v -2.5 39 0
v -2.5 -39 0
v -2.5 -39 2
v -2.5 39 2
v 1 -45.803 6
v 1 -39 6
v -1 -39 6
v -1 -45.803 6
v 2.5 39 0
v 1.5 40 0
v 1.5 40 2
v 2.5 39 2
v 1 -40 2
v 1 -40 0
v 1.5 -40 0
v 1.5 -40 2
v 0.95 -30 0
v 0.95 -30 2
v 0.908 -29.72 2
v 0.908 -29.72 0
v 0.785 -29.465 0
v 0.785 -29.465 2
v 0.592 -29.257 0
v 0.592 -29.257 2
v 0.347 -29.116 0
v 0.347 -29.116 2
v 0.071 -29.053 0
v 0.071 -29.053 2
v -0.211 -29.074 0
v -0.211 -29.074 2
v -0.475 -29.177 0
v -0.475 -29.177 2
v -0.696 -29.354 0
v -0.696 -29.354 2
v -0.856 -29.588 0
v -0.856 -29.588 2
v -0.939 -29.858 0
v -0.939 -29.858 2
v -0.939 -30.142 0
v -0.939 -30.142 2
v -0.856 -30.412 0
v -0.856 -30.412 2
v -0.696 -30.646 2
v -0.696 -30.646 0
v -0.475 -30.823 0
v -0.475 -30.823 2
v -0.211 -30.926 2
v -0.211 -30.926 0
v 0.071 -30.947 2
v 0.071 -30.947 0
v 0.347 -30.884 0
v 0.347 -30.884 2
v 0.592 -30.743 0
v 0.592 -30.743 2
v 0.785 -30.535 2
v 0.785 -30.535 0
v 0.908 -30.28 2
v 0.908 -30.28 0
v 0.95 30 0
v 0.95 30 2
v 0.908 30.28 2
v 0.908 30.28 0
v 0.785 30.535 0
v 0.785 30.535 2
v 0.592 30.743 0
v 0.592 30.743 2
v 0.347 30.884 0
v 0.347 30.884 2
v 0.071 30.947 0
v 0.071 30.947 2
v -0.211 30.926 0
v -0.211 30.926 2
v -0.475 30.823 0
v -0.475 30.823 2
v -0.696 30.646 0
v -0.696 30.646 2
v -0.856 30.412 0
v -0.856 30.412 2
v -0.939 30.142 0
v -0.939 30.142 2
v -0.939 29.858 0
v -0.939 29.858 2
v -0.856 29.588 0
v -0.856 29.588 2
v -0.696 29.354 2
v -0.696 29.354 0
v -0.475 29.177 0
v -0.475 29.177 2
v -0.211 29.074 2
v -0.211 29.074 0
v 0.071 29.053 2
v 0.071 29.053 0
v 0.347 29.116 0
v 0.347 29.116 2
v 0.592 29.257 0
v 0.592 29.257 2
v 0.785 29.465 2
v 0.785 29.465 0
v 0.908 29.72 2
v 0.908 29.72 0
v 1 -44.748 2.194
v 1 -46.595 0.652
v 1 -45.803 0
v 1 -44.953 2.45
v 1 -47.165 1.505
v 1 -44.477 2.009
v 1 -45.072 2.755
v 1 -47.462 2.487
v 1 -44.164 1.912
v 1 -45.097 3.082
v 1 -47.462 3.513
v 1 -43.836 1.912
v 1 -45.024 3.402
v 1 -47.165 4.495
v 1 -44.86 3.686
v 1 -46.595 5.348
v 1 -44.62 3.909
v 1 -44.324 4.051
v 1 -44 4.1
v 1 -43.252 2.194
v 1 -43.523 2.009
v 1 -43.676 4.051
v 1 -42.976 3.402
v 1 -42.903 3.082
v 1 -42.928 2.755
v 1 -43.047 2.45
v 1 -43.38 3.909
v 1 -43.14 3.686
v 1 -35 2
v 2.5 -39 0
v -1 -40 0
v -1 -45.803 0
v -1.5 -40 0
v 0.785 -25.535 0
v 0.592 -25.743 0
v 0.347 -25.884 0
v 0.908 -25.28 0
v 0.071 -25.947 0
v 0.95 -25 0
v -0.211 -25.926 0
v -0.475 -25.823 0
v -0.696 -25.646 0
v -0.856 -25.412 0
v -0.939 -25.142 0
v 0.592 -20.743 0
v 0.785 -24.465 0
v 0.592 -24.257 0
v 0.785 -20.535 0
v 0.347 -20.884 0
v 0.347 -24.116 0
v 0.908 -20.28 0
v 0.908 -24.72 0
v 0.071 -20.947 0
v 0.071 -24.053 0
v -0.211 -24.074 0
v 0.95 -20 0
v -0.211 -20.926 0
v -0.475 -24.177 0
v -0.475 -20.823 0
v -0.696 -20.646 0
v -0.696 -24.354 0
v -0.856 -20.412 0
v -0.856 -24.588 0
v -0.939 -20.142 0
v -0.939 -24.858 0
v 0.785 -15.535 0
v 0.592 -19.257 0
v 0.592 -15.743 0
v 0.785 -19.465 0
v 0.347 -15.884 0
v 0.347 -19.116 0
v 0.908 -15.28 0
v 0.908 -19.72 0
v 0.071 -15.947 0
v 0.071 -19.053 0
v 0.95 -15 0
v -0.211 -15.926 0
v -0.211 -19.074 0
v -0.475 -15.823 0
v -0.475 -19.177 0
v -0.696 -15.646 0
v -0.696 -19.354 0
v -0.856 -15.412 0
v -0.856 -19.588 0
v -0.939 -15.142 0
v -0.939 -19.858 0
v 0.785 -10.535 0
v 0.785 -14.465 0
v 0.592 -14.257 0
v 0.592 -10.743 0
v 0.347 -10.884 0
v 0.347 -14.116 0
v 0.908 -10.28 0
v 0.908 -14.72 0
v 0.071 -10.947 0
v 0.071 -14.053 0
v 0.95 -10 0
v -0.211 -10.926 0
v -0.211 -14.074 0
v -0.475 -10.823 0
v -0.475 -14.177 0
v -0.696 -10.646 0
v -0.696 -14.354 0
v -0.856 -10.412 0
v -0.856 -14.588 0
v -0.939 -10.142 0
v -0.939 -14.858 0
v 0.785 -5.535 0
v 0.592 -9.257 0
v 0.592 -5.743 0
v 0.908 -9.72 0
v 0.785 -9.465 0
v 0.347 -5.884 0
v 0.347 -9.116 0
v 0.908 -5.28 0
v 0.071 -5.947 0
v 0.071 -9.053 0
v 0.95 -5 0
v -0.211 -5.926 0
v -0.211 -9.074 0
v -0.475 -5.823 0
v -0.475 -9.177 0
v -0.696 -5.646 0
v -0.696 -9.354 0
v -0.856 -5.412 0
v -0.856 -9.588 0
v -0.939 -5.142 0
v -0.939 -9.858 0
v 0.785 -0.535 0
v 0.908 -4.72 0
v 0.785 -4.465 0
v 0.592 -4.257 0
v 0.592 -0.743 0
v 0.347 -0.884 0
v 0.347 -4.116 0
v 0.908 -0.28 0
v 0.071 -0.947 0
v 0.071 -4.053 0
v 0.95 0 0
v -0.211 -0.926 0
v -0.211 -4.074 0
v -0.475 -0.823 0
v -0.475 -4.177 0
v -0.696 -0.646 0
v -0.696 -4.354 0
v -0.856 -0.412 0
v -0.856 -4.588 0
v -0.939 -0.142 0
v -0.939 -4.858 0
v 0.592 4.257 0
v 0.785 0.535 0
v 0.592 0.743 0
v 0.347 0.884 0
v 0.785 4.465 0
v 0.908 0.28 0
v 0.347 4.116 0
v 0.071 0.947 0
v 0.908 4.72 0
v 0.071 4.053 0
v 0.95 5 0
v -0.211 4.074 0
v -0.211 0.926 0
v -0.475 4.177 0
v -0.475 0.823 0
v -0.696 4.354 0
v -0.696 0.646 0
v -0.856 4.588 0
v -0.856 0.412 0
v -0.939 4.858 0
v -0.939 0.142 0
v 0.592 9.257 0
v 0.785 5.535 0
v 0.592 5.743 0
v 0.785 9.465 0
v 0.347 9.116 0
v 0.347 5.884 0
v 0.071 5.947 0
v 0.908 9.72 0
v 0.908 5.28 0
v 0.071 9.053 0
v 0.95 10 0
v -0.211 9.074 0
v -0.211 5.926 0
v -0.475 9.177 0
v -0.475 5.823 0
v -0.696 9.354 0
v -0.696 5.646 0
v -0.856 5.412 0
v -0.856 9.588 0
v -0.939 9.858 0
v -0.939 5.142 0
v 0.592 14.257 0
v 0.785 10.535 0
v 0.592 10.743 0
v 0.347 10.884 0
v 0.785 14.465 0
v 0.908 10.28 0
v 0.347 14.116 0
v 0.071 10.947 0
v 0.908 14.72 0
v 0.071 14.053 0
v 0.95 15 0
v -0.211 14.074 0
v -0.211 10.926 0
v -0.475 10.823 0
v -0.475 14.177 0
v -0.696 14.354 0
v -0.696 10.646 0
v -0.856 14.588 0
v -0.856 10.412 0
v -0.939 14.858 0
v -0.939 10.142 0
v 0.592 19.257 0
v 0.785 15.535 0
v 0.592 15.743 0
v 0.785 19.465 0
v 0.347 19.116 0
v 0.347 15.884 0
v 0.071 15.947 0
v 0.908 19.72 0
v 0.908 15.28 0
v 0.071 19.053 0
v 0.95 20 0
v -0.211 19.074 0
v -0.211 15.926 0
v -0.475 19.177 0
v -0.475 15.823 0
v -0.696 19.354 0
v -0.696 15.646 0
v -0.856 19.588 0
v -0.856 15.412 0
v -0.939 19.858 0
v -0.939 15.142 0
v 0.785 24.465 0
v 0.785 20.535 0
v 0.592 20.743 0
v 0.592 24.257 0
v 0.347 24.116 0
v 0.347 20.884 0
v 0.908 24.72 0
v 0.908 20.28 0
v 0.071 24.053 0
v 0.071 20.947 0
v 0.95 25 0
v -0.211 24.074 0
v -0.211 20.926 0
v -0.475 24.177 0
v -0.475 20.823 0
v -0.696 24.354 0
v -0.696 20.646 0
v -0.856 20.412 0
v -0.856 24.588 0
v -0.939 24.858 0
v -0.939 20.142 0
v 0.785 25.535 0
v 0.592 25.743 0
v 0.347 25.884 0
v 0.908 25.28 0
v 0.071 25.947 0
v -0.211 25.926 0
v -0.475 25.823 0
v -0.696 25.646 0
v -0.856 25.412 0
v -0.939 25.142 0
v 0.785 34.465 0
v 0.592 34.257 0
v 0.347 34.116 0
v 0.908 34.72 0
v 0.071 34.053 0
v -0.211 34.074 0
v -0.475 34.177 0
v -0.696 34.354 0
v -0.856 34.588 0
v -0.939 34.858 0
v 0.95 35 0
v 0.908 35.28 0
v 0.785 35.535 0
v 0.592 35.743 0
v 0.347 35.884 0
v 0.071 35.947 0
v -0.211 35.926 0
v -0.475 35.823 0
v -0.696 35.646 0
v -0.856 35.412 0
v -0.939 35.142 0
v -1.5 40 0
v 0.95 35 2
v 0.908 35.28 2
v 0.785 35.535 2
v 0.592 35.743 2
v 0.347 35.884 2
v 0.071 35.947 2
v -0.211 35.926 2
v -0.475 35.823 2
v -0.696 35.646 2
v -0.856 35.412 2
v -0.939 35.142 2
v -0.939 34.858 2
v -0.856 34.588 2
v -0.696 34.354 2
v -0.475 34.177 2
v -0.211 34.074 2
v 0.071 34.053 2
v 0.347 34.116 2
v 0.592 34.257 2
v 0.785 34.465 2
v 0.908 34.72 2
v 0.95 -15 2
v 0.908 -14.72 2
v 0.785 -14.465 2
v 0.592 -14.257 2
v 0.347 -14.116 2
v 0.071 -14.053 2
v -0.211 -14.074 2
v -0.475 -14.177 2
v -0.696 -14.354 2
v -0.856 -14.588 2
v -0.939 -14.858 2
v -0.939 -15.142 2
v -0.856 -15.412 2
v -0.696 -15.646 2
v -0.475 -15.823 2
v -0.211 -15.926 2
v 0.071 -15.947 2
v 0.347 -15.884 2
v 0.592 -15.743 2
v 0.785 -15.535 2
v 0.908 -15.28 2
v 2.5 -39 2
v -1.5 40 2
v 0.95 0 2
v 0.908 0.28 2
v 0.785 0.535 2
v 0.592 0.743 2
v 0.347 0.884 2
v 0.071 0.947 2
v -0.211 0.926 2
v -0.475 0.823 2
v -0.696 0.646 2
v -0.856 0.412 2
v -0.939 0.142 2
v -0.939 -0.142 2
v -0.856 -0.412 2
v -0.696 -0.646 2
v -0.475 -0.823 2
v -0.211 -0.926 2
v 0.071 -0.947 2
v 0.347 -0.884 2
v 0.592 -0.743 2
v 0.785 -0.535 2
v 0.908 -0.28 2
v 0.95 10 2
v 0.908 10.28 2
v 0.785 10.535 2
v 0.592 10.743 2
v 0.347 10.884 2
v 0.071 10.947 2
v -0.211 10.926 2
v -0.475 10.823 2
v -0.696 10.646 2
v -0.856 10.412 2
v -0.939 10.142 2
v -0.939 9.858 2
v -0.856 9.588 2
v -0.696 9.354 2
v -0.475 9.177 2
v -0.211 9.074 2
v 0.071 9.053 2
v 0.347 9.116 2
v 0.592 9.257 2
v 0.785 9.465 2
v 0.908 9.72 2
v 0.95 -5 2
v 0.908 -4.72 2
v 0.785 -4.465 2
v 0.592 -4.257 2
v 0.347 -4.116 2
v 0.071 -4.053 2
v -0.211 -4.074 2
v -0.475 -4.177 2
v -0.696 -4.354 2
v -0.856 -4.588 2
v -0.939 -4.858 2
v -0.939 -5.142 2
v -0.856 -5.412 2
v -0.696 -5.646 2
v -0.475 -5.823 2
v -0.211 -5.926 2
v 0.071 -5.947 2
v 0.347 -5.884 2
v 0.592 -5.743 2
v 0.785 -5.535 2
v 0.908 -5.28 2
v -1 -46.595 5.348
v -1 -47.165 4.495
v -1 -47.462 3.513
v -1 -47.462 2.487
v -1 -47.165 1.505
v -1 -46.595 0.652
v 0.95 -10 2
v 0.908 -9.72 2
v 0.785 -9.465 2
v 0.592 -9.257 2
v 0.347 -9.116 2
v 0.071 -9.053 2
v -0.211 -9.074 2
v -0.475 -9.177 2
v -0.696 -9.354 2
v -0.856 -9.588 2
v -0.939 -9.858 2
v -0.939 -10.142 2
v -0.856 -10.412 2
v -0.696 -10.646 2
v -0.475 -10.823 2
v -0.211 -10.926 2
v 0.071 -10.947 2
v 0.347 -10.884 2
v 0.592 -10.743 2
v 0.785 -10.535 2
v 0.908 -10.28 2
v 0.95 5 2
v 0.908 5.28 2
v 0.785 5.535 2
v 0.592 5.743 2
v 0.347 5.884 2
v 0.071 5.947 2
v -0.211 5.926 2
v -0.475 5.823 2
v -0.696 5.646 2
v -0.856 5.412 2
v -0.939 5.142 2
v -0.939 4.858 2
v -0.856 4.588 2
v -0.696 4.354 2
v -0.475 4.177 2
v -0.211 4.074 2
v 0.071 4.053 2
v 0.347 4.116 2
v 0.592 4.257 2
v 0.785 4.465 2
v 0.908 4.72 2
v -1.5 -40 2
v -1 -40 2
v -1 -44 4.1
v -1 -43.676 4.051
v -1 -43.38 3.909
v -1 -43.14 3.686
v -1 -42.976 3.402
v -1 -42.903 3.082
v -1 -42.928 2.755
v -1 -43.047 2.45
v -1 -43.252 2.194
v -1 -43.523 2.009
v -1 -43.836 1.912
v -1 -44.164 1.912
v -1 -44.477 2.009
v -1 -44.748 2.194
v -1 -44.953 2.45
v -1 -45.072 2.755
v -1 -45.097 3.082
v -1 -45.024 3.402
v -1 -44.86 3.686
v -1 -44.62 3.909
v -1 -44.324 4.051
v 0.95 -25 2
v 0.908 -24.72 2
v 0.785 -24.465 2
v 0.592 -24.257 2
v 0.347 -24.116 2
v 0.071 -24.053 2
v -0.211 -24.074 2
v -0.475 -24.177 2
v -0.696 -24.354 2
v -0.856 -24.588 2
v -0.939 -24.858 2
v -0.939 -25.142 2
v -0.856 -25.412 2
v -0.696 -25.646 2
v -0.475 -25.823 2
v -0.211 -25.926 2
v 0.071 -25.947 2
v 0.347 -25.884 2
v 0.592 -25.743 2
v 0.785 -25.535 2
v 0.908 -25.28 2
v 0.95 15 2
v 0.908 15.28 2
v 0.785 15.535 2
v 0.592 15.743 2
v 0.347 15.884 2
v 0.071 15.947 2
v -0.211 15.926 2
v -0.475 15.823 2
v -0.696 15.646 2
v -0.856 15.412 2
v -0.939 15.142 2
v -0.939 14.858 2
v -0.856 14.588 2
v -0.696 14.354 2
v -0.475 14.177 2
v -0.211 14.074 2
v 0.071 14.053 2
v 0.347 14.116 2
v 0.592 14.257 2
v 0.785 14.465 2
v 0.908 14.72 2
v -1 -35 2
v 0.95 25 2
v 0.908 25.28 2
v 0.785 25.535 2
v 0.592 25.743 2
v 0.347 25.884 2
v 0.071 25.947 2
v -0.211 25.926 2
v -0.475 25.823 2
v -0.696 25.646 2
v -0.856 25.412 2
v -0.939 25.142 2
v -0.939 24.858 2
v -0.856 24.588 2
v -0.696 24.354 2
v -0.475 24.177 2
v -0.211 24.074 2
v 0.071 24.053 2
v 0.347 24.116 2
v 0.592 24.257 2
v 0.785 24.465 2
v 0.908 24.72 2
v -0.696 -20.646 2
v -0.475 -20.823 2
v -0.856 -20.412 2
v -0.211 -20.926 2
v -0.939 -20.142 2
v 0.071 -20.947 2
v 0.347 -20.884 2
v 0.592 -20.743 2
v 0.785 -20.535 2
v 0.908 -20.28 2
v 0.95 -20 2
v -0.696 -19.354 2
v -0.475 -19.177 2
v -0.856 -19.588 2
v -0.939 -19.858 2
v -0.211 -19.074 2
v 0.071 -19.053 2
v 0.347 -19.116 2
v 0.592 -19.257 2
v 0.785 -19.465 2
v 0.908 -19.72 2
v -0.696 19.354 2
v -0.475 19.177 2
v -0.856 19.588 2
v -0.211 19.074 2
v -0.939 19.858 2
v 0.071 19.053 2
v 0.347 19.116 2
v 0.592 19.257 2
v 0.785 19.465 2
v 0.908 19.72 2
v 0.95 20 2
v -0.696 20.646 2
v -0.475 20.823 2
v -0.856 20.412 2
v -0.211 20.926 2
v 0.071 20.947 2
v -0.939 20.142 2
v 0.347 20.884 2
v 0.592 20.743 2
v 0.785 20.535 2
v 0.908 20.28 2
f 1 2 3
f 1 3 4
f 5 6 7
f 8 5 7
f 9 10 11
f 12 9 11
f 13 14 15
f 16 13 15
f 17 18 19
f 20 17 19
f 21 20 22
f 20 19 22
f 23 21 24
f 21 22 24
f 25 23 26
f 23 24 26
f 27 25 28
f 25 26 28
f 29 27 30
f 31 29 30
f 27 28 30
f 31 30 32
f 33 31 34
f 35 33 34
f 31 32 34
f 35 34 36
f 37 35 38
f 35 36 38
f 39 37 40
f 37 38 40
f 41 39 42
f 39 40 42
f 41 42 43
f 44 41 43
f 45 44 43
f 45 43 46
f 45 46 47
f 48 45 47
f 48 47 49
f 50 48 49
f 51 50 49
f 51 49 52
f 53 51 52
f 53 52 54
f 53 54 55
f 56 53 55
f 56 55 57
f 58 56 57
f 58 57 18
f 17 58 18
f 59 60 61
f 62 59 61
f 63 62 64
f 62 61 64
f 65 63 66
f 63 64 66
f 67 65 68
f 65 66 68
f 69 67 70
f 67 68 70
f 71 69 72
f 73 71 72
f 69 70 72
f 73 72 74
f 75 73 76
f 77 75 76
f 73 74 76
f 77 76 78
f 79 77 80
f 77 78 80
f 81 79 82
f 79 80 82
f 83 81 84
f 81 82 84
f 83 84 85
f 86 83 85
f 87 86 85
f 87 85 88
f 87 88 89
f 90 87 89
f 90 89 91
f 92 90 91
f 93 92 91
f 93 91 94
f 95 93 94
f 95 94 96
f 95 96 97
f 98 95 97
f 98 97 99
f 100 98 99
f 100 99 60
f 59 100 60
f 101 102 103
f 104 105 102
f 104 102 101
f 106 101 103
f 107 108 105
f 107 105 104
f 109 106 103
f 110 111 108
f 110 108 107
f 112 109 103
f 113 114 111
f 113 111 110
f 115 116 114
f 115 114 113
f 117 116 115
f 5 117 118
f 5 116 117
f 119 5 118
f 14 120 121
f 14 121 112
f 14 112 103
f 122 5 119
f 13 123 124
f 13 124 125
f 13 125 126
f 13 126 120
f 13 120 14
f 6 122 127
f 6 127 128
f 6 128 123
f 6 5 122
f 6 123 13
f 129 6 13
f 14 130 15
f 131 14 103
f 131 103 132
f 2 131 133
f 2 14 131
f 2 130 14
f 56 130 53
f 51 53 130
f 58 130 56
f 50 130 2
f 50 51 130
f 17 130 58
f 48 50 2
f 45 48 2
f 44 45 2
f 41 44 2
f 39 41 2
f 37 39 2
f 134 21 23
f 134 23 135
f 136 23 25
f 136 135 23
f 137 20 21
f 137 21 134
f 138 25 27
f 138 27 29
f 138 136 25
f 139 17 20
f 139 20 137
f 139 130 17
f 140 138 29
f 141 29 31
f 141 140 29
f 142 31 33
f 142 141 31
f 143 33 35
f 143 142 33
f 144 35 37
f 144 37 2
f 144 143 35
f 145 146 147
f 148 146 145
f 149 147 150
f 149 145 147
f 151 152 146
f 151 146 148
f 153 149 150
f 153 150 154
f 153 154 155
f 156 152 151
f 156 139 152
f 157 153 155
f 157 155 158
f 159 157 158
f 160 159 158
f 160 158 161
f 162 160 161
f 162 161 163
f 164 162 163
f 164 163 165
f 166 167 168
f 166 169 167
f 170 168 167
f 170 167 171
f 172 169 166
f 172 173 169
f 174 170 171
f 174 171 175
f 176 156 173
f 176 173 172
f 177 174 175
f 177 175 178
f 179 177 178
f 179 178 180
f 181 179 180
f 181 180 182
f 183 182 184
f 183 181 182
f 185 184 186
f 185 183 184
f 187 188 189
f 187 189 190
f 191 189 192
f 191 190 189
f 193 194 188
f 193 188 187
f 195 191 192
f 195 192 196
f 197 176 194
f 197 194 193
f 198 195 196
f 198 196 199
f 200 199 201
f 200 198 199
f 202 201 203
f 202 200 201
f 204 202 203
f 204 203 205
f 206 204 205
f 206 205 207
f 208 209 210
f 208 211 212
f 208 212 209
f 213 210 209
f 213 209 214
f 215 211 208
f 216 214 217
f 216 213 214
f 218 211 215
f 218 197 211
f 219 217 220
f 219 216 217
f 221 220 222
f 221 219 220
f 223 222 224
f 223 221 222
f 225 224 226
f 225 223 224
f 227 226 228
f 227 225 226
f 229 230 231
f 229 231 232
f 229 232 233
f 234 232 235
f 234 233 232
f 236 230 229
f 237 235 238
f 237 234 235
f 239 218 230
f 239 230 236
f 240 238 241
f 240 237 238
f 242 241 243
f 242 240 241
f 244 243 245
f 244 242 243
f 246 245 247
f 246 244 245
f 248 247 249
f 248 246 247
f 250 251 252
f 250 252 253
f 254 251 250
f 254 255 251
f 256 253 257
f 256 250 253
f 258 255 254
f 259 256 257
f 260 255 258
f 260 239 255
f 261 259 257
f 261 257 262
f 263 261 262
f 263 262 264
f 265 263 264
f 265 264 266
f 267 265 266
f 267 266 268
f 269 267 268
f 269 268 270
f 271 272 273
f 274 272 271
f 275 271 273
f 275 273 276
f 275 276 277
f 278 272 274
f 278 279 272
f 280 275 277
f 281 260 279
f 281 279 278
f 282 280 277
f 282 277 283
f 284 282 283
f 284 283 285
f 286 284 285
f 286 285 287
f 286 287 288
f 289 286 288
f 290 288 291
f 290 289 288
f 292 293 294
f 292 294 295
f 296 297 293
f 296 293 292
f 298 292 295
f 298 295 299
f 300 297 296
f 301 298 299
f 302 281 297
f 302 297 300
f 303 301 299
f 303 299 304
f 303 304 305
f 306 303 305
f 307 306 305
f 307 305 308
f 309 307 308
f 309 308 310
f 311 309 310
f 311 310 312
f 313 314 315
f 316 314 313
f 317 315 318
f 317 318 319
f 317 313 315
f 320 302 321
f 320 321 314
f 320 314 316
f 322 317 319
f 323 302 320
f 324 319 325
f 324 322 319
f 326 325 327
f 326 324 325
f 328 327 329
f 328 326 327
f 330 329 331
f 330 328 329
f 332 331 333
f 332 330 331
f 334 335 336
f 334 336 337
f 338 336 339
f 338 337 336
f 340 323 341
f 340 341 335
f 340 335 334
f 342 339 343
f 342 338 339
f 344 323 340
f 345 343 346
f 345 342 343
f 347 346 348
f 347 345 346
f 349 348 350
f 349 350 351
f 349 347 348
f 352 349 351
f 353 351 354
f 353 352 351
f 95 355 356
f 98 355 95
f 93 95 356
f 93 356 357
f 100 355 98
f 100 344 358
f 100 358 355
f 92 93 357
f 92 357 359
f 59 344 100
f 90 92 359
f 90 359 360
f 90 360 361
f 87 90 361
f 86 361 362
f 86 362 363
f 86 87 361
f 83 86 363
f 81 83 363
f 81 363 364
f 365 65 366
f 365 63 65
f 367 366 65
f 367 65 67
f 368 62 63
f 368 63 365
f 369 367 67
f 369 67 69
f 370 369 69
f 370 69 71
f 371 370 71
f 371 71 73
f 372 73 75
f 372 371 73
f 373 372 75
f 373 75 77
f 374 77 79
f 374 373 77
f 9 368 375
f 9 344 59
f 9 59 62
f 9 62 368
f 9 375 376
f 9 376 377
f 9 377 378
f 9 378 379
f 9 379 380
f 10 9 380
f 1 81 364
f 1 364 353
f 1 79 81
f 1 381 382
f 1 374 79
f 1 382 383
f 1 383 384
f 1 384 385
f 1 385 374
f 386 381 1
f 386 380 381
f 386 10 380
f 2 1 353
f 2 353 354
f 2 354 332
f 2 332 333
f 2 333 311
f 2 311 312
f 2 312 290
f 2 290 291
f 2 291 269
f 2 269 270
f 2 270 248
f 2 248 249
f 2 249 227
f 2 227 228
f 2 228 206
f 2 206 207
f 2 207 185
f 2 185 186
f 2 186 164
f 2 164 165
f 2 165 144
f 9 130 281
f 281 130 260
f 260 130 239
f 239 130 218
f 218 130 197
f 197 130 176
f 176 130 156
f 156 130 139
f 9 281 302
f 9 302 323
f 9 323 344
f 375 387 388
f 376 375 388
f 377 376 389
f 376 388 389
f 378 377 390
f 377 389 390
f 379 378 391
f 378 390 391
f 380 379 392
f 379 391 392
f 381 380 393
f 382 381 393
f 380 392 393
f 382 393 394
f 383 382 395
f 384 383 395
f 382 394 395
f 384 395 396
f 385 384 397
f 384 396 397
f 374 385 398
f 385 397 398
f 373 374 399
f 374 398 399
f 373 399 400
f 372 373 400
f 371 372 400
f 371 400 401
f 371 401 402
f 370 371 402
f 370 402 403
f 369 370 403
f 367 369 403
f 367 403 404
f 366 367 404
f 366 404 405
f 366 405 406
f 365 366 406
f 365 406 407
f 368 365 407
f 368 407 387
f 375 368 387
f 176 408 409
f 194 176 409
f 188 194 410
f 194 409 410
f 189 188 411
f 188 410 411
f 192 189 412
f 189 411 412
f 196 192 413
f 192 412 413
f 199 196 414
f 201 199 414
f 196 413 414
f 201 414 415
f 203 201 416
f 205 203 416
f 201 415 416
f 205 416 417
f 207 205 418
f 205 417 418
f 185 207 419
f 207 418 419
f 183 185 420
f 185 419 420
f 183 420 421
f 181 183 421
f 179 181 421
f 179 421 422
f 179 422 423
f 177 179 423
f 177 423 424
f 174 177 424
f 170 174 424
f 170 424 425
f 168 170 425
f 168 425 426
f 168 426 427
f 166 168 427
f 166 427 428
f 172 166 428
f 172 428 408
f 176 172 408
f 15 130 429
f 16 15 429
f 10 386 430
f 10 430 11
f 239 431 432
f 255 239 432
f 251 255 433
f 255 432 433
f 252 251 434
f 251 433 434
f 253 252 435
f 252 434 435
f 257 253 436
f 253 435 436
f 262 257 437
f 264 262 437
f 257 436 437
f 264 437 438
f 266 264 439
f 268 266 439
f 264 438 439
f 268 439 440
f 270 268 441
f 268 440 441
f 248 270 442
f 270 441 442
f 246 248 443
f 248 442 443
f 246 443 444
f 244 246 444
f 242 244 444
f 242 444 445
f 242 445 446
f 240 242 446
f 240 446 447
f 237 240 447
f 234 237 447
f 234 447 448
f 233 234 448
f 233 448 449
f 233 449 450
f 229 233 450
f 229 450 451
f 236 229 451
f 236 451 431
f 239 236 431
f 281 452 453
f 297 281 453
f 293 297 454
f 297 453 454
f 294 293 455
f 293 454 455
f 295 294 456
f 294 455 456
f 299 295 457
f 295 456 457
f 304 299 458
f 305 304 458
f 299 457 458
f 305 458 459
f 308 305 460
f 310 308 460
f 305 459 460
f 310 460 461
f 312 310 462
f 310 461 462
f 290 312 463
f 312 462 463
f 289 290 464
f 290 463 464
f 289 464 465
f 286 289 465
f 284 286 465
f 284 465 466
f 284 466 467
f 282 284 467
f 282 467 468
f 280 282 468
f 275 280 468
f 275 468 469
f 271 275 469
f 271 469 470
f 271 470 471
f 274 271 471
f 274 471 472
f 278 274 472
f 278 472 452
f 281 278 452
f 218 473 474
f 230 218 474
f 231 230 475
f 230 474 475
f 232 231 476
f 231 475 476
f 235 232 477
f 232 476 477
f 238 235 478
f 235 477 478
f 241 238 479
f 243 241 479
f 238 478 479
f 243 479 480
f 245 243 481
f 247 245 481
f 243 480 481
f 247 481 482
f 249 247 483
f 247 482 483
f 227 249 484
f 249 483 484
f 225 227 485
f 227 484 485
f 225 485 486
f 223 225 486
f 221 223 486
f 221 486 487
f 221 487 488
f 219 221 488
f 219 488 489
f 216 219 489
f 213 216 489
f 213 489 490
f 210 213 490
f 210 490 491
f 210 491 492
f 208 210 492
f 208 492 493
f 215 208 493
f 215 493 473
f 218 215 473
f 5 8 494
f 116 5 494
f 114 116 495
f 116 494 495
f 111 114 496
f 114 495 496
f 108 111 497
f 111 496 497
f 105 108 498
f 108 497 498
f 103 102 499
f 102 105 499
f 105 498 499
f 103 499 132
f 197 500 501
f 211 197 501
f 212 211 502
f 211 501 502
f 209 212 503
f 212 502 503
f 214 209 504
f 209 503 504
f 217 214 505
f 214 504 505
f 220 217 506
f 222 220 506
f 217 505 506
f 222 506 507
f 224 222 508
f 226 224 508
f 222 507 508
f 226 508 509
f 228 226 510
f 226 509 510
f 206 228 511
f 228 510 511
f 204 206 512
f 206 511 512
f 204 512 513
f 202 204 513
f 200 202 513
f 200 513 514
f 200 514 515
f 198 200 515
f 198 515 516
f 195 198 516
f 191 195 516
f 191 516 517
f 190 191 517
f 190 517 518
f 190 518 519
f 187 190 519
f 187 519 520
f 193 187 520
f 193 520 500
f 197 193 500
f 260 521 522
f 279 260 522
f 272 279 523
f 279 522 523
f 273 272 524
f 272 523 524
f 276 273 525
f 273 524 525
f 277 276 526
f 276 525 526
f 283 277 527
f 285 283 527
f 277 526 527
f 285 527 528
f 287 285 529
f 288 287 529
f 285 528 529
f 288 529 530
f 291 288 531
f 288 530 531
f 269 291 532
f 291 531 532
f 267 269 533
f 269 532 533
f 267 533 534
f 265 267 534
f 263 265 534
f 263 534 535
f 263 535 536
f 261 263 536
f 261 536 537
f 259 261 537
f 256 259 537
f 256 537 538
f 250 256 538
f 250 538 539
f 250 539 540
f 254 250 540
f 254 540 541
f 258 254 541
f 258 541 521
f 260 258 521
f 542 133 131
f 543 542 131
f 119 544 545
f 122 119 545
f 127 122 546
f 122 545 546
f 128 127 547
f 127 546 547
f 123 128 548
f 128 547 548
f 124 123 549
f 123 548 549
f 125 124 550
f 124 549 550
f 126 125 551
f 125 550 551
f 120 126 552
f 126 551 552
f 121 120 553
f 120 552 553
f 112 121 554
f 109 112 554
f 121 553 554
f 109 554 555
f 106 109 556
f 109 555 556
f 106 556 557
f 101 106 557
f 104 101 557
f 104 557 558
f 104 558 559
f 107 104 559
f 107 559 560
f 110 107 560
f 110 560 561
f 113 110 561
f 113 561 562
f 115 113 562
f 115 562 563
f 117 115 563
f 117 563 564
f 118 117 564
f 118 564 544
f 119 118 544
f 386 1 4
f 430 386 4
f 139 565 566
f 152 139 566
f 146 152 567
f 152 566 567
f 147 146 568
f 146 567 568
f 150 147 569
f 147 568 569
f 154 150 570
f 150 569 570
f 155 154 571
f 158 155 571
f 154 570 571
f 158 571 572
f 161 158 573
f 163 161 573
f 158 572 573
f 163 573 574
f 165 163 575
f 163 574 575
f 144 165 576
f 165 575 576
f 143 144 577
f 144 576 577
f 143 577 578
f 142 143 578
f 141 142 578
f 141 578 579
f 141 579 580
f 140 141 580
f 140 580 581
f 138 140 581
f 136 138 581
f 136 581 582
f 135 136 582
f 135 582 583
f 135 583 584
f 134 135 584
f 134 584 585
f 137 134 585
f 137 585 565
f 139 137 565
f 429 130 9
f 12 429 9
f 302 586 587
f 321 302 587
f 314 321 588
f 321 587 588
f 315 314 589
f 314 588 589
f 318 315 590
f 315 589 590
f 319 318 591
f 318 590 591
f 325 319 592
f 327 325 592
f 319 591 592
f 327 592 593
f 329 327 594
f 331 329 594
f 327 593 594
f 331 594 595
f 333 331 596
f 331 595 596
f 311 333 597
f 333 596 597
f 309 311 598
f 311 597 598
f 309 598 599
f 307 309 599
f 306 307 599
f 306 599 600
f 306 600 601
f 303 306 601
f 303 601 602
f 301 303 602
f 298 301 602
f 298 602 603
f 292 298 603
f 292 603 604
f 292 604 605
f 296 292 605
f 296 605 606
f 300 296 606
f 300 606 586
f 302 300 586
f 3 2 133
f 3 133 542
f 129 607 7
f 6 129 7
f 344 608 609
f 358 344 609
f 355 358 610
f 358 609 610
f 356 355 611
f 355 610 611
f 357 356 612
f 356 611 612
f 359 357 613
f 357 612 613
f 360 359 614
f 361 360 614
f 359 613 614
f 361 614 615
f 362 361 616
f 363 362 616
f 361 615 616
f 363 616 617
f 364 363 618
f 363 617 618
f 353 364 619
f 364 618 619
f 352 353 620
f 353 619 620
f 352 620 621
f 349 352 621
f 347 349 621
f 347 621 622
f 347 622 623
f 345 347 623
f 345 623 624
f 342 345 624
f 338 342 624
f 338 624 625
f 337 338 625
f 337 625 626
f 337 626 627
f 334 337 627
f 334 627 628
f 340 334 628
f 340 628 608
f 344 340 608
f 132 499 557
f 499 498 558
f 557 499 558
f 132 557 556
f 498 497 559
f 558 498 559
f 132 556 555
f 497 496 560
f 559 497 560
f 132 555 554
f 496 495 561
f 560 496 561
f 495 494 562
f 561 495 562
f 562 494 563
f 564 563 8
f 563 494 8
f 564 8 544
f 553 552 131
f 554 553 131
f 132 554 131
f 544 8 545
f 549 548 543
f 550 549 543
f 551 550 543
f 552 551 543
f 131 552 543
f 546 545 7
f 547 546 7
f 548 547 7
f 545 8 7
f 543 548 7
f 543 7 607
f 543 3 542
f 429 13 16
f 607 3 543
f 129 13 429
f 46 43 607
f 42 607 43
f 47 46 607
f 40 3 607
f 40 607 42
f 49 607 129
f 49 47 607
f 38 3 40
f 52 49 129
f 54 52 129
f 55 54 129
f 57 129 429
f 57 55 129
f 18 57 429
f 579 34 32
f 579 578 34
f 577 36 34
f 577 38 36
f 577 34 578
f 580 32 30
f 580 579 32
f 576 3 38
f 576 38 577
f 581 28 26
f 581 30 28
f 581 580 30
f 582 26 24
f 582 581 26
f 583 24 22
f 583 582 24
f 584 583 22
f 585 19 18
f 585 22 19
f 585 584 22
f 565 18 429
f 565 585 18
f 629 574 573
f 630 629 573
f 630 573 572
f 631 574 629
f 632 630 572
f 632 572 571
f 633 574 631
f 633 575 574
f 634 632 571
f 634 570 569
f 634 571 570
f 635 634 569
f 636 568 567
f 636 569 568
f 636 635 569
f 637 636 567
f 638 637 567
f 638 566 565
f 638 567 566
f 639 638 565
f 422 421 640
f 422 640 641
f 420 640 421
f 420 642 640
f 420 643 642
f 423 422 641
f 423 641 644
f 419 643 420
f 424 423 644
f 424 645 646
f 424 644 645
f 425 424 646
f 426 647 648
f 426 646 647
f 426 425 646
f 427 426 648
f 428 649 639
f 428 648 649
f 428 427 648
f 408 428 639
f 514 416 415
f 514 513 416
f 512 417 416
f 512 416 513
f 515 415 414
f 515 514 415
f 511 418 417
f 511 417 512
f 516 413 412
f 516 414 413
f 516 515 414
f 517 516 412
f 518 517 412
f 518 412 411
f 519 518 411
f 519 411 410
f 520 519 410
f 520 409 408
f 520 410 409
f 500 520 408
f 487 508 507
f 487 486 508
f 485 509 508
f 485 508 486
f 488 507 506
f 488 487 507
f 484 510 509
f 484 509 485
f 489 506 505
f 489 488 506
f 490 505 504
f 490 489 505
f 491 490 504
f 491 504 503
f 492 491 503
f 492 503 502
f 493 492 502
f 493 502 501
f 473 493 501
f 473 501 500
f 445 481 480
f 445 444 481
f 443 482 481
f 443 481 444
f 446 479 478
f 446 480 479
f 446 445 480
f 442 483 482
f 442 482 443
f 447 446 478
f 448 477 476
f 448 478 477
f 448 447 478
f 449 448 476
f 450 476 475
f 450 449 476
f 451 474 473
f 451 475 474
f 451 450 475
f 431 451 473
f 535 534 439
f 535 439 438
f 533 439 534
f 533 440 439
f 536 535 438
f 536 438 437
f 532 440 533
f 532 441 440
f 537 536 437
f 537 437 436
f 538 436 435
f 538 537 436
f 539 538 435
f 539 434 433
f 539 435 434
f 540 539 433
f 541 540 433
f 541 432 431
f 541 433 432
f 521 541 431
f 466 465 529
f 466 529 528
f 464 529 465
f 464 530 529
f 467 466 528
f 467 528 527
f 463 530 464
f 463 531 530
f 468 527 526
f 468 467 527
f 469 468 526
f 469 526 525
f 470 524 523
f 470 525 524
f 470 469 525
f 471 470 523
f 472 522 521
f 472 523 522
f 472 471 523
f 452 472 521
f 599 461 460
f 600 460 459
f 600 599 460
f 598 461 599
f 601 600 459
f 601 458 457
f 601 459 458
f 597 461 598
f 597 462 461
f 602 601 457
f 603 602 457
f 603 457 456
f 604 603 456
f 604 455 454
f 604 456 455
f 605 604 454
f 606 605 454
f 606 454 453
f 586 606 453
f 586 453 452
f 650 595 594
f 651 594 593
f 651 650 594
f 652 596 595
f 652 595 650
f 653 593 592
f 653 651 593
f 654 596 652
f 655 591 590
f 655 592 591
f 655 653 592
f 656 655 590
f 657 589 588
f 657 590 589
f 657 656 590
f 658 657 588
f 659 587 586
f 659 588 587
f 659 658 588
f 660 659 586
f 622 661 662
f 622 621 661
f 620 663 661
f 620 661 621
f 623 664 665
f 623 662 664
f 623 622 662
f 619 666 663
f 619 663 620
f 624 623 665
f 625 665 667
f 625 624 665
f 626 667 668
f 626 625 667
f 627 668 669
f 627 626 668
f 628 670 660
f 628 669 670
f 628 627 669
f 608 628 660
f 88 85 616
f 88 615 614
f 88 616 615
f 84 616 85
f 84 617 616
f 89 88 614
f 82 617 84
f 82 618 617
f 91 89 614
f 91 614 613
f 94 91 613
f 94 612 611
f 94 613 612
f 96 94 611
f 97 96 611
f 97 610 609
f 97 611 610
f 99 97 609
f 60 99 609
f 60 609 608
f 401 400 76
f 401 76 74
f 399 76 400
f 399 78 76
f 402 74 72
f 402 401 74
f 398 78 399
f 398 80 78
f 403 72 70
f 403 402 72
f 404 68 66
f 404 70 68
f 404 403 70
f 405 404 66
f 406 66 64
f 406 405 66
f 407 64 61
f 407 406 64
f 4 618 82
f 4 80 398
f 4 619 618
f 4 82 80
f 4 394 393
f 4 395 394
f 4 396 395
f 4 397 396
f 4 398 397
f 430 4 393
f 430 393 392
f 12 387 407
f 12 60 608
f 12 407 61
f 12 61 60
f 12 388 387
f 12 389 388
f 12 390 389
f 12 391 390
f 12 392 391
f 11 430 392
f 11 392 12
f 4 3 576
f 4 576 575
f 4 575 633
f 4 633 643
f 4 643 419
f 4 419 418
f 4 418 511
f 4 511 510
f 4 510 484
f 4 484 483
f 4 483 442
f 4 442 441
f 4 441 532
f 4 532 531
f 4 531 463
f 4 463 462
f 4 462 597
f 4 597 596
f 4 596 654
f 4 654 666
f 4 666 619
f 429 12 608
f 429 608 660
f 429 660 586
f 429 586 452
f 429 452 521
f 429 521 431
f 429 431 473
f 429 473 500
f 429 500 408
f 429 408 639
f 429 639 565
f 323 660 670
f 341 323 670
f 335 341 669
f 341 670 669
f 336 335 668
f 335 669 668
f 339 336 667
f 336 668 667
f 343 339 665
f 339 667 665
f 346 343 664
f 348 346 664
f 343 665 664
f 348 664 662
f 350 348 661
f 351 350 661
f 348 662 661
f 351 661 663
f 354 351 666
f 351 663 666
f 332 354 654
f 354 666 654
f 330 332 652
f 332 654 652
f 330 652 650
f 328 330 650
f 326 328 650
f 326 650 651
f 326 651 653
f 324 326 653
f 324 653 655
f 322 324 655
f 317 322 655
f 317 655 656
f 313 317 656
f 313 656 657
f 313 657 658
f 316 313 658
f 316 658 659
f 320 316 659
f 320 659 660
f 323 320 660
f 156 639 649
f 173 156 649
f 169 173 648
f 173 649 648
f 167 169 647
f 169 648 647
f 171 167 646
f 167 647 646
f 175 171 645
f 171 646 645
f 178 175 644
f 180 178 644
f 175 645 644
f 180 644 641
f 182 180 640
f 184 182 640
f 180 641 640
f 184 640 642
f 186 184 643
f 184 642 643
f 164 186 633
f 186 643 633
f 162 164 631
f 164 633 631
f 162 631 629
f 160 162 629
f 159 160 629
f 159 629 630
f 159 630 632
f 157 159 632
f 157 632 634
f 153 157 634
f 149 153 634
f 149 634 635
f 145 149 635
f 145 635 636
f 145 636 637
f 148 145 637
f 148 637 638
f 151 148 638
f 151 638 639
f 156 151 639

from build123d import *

# Parameters (mm, degrees)
SKETCH1_W           = 5
SKETCH1_H           = 80
BOSS_EXTRUDE1_DEPTH = 2
SKETCH3_R           = 0.95
CUT_EXTRUDE1_DEPTH  = 41.127920454
SKETCH2_W           = 2
SKETCH2_H           = 8
BOSS_EXTRUDE2_DEPTH = 6
CUT_EXTRUDE2_REACH  = 50.5
SKETCH4_R           = 1.1
CHAMFER1_SIZE       = 5
CHAMFER2_SIZE       = 1


with BuildPart() as part:
    # Sketch1 → Boss-Extrude1 (new body)
    with BuildSketch(Plane.XY):
        Rectangle(SKETCH1_W, SKETCH1_H)
    extrude(amount=BOSS_EXTRUDE1_DEPTH)

    # Sketch3 → Cut-Extrude1 (cut, through all)
    with BuildSketch(Plane.XY.offset(2)):
        with Locations((0, 35)):
            Circle(SKETCH3_R)
        with Locations((0, 30)):
            Circle(SKETCH3_R)
        with Locations((0, 25)):
            Circle(SKETCH3_R)
        with Locations((0, 20)):
            Circle(SKETCH3_R)
        with Locations((0, 15)):
            Circle(SKETCH3_R)
        with Locations((0, 10)):
            Circle(SKETCH3_R)
        with Locations((0, 5)):
            Circle(SKETCH3_R)
        Circle(SKETCH3_R)
        with Locations((0, -5)):
            Circle(SKETCH3_R)
        with Locations((0, -10)):
            Circle(SKETCH3_R)
        with Locations((0, -15)):
            Circle(SKETCH3_R)
        with Locations((0, -20)):
            Circle(SKETCH3_R)
        with Locations((0, -25)):
            Circle(SKETCH3_R)
        with Locations((0, -30)):
            Circle(SKETCH3_R)
    extrude(amount=-CUT_EXTRUDE1_DEPTH, mode=Mode.SUBTRACT)

    # Sketch2 → Boss-Extrude2 (add)
    with BuildSketch(Plane(origin=(0, 0, 0), x_dir=(-1, 0, 0), z_dir=(0, 0, -1))):
        with Locations((0, -44)):
            Rectangle(SKETCH2_W, SKETCH2_H)
    extrude(amount=-BOSS_EXTRUDE2_DEPTH)

    # Sketch4 → Cut-Extrude2 (cut, up to next)
    with BuildSketch(Plane.ZY.offset(1), mode=Mode.PRIVATE) as cut_extrude2_sk1:
        with Locations((3, -44)):
            Circle(SKETCH4_R)
    cut_extrude2_tool1 = extrude(cut_extrude2_sk1.sketch, amount=-CUT_EXTRUDE2_REACH, mode=Mode.PRIVATE) & part.part
    # Sketch4 → Cut-Extrude2 (cut, up to next)
    with BuildSketch(Plane.ZY.offset(1), mode=Mode.PRIVATE) as cut_extrude2_sk2:
        with BuildLine():
            Line((0, -45.802775638), (0, -48))
            Line((0, -48), (6, -48))
            Line((6, -48), (6, -45.802775638))
            ThreePointArc((6, -45.802775638), (3, -47.5), (0, -45.802775638))
        make_face()
    cut_extrude2_tool2 = extrude(cut_extrude2_sk2.sketch, amount=-CUT_EXTRUDE2_REACH, mode=Mode.PRIVATE) & part.part
    add(cut_extrude2_tool1.solids().sort_by_distance((-1, -44, 3))[0], mode=Mode.SUBTRACT)
    add(cut_extrude2_tool2.solids().sort_by_distance((-1, -47.563897, 3))[0], mode=Mode.SUBTRACT)

    # Chamfer1
    # the kernel refuses this chamfer: 5 mm, written as the material it adds along each edge
    with BuildSketch(Plane(origin=(-1, -40, 2), x_dir=(0, 0.9996219169112968, -0.02749587661058636), z_dir=(1, 0, 0))) as chamfer1_piece_1_section:
        Polygon((CHAMFER1_SIZE * 0.999621916911, CHAMFER1_SIZE * 0.0274958766106), (-CHAMFER1_SIZE * 0.0274958766106, CHAMFER1_SIZE * 0.999621916911), (0, 0), align=None)
    chamfer1_piece_1 = extrude(amount=2, mode=Mode.PRIVATE)
    chamfer1_piece_1 = split(chamfer1_piece_1, bisect_by=Plane(origin=(0, -38.277777778, 6), z_dir=(0, 0, -1)), keep=Keep.TOP, mode=Mode.PRIVATE)
    add(chamfer1_piece_1)

    # Chamfer2
    chamfer2_edges = [part.edges().sort_by_distance(p)[0] for p in [
        (-2.5, 40, 1),
        (2.5, 40, 1),
        (-2.5, -40, 1),
        (2.5, -40, 1),
    ]]
    chamfer(chamfer2_edges, length=CHAMFER2_SIZE)


solid = part.part
